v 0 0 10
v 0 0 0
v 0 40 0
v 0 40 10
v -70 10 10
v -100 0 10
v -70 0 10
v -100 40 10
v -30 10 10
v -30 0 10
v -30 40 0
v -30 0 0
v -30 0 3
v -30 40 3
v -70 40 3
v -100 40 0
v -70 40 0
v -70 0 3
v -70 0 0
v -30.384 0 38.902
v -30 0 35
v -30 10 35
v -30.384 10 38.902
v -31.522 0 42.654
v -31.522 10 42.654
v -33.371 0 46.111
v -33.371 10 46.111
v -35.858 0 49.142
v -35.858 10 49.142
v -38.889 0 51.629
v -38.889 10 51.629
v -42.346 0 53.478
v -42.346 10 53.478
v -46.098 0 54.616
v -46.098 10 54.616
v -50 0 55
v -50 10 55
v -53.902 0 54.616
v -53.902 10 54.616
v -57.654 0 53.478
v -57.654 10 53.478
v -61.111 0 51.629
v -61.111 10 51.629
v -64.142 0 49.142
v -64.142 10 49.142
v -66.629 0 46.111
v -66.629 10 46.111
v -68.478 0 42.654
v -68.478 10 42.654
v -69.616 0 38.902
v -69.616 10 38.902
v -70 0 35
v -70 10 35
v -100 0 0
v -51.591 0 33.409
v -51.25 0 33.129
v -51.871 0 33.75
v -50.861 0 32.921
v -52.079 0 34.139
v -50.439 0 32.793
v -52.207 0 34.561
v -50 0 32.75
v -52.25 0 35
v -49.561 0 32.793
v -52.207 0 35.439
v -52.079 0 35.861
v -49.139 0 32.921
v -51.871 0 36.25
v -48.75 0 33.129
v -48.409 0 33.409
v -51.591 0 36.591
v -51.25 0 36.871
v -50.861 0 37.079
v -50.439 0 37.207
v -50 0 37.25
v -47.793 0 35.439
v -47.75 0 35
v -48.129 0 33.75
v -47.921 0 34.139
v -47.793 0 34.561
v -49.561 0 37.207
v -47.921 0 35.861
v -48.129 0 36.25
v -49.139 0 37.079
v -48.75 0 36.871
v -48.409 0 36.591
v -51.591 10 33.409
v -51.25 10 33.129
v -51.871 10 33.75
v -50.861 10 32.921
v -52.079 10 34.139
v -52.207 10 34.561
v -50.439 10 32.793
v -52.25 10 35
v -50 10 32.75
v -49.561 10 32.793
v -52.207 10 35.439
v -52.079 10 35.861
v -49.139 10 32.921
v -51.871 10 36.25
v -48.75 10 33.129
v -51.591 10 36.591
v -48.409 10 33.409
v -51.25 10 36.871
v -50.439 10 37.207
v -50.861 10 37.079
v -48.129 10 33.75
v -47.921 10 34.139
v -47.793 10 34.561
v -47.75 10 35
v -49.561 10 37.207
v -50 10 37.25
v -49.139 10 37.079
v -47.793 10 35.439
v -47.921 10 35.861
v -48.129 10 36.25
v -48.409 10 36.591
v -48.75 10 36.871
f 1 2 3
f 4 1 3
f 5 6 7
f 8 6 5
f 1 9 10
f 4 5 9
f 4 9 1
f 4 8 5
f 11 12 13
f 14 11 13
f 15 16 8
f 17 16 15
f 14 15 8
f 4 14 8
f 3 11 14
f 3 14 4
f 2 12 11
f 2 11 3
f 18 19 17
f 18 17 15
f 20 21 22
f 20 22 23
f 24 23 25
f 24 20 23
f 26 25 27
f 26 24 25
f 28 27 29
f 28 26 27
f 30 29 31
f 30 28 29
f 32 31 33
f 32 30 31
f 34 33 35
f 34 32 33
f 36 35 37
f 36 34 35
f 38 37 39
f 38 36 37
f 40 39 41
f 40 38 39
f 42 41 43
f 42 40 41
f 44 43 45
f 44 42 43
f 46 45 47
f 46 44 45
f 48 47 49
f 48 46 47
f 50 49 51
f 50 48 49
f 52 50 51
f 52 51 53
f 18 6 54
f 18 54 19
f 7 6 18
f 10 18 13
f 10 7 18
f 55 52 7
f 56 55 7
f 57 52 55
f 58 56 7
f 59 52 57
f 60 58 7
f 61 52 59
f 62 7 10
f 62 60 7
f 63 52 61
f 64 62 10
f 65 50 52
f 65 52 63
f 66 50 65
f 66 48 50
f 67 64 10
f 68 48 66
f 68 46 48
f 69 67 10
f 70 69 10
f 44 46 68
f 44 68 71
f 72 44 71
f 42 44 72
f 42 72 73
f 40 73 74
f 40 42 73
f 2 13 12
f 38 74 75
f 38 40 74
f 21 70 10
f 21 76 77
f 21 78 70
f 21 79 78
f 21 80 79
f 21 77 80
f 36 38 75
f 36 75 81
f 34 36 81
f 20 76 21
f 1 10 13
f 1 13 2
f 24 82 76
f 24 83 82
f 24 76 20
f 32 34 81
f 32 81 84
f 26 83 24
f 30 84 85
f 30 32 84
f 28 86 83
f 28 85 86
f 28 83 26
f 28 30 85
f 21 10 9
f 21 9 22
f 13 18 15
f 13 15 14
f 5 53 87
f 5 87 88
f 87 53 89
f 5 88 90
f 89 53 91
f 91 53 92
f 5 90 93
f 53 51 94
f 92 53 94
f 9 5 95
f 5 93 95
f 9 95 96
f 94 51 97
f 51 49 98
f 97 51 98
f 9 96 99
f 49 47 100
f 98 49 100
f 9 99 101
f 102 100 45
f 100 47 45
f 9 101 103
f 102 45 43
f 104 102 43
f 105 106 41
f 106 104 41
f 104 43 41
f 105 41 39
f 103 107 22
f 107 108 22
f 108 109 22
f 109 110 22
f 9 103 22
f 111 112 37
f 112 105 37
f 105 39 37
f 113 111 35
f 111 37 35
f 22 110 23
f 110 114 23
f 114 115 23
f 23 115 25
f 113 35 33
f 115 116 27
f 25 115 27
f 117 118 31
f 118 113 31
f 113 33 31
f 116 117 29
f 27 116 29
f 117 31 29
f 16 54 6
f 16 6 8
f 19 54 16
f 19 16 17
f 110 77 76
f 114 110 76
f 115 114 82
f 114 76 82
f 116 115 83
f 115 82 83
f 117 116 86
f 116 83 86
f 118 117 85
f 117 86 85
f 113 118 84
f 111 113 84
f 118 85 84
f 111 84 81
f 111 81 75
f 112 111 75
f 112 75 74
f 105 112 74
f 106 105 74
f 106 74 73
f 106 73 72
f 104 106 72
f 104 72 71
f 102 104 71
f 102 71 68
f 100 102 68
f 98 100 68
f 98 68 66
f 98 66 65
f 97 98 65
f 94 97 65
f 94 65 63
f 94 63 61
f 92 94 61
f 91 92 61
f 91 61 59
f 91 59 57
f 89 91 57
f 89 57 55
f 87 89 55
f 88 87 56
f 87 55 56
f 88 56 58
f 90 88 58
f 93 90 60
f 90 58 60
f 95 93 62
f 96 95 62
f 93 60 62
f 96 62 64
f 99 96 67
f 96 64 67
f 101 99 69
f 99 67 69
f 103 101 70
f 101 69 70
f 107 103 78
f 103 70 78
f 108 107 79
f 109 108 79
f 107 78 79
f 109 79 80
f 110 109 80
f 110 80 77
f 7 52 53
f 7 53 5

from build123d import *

# Parameters (mm, degrees)
F0_W     = 100
F0_H     = 40
F1_DEPTH = 10
F2_W     = 40
F2_H     = 10
F3_DEPTH = 10
F4_W     = 40
F4_H     = 3
F5_DEPTH = 40.001
F6_R     = 2.25
F7_DEPTH = 40.001


with BuildPart() as f1:
    # F0 (on Top) → F1 (new body)
    with BuildSketch(Plane.XY):
        with Locations((-50, 20)):
            Rectangle(F0_W, F0_H)
    extrude(amount=F1_DEPTH)

    # F2 (on face) → F3 (join)
    with BuildSketch(Plane.XZ):
        with BuildLine():
            Line((-70, 35), (-70, 10))
            Line((-70, 10), (-30, 10))
            Line((-30, 10), (-30, 35))
            ThreePointArc((-30, 35), (-50, 55), (-70, 35))
        make_face()
        with Locations((-50, 5)):
            Rectangle(F2_W, F2_H)
    extrude(amount=-F3_DEPTH)

    # F4 (on face) → F5 (cut, through all)
    with BuildSketch(Plane.XZ):
        with Locations((-50, 1.5)):
            Rectangle(F4_W, F4_H)
    extrude(amount=-F5_DEPTH, mode=Mode.SUBTRACT)

    # F6 (on face) → F7 (cut, through all)
    with BuildSketch(Plane.XZ):
        with Locations((-50, 35)):
            Circle(F6_R)
    extrude(amount=-F7_DEPTH, mode=Mode.SUBTRACT)


solid = f1.part
